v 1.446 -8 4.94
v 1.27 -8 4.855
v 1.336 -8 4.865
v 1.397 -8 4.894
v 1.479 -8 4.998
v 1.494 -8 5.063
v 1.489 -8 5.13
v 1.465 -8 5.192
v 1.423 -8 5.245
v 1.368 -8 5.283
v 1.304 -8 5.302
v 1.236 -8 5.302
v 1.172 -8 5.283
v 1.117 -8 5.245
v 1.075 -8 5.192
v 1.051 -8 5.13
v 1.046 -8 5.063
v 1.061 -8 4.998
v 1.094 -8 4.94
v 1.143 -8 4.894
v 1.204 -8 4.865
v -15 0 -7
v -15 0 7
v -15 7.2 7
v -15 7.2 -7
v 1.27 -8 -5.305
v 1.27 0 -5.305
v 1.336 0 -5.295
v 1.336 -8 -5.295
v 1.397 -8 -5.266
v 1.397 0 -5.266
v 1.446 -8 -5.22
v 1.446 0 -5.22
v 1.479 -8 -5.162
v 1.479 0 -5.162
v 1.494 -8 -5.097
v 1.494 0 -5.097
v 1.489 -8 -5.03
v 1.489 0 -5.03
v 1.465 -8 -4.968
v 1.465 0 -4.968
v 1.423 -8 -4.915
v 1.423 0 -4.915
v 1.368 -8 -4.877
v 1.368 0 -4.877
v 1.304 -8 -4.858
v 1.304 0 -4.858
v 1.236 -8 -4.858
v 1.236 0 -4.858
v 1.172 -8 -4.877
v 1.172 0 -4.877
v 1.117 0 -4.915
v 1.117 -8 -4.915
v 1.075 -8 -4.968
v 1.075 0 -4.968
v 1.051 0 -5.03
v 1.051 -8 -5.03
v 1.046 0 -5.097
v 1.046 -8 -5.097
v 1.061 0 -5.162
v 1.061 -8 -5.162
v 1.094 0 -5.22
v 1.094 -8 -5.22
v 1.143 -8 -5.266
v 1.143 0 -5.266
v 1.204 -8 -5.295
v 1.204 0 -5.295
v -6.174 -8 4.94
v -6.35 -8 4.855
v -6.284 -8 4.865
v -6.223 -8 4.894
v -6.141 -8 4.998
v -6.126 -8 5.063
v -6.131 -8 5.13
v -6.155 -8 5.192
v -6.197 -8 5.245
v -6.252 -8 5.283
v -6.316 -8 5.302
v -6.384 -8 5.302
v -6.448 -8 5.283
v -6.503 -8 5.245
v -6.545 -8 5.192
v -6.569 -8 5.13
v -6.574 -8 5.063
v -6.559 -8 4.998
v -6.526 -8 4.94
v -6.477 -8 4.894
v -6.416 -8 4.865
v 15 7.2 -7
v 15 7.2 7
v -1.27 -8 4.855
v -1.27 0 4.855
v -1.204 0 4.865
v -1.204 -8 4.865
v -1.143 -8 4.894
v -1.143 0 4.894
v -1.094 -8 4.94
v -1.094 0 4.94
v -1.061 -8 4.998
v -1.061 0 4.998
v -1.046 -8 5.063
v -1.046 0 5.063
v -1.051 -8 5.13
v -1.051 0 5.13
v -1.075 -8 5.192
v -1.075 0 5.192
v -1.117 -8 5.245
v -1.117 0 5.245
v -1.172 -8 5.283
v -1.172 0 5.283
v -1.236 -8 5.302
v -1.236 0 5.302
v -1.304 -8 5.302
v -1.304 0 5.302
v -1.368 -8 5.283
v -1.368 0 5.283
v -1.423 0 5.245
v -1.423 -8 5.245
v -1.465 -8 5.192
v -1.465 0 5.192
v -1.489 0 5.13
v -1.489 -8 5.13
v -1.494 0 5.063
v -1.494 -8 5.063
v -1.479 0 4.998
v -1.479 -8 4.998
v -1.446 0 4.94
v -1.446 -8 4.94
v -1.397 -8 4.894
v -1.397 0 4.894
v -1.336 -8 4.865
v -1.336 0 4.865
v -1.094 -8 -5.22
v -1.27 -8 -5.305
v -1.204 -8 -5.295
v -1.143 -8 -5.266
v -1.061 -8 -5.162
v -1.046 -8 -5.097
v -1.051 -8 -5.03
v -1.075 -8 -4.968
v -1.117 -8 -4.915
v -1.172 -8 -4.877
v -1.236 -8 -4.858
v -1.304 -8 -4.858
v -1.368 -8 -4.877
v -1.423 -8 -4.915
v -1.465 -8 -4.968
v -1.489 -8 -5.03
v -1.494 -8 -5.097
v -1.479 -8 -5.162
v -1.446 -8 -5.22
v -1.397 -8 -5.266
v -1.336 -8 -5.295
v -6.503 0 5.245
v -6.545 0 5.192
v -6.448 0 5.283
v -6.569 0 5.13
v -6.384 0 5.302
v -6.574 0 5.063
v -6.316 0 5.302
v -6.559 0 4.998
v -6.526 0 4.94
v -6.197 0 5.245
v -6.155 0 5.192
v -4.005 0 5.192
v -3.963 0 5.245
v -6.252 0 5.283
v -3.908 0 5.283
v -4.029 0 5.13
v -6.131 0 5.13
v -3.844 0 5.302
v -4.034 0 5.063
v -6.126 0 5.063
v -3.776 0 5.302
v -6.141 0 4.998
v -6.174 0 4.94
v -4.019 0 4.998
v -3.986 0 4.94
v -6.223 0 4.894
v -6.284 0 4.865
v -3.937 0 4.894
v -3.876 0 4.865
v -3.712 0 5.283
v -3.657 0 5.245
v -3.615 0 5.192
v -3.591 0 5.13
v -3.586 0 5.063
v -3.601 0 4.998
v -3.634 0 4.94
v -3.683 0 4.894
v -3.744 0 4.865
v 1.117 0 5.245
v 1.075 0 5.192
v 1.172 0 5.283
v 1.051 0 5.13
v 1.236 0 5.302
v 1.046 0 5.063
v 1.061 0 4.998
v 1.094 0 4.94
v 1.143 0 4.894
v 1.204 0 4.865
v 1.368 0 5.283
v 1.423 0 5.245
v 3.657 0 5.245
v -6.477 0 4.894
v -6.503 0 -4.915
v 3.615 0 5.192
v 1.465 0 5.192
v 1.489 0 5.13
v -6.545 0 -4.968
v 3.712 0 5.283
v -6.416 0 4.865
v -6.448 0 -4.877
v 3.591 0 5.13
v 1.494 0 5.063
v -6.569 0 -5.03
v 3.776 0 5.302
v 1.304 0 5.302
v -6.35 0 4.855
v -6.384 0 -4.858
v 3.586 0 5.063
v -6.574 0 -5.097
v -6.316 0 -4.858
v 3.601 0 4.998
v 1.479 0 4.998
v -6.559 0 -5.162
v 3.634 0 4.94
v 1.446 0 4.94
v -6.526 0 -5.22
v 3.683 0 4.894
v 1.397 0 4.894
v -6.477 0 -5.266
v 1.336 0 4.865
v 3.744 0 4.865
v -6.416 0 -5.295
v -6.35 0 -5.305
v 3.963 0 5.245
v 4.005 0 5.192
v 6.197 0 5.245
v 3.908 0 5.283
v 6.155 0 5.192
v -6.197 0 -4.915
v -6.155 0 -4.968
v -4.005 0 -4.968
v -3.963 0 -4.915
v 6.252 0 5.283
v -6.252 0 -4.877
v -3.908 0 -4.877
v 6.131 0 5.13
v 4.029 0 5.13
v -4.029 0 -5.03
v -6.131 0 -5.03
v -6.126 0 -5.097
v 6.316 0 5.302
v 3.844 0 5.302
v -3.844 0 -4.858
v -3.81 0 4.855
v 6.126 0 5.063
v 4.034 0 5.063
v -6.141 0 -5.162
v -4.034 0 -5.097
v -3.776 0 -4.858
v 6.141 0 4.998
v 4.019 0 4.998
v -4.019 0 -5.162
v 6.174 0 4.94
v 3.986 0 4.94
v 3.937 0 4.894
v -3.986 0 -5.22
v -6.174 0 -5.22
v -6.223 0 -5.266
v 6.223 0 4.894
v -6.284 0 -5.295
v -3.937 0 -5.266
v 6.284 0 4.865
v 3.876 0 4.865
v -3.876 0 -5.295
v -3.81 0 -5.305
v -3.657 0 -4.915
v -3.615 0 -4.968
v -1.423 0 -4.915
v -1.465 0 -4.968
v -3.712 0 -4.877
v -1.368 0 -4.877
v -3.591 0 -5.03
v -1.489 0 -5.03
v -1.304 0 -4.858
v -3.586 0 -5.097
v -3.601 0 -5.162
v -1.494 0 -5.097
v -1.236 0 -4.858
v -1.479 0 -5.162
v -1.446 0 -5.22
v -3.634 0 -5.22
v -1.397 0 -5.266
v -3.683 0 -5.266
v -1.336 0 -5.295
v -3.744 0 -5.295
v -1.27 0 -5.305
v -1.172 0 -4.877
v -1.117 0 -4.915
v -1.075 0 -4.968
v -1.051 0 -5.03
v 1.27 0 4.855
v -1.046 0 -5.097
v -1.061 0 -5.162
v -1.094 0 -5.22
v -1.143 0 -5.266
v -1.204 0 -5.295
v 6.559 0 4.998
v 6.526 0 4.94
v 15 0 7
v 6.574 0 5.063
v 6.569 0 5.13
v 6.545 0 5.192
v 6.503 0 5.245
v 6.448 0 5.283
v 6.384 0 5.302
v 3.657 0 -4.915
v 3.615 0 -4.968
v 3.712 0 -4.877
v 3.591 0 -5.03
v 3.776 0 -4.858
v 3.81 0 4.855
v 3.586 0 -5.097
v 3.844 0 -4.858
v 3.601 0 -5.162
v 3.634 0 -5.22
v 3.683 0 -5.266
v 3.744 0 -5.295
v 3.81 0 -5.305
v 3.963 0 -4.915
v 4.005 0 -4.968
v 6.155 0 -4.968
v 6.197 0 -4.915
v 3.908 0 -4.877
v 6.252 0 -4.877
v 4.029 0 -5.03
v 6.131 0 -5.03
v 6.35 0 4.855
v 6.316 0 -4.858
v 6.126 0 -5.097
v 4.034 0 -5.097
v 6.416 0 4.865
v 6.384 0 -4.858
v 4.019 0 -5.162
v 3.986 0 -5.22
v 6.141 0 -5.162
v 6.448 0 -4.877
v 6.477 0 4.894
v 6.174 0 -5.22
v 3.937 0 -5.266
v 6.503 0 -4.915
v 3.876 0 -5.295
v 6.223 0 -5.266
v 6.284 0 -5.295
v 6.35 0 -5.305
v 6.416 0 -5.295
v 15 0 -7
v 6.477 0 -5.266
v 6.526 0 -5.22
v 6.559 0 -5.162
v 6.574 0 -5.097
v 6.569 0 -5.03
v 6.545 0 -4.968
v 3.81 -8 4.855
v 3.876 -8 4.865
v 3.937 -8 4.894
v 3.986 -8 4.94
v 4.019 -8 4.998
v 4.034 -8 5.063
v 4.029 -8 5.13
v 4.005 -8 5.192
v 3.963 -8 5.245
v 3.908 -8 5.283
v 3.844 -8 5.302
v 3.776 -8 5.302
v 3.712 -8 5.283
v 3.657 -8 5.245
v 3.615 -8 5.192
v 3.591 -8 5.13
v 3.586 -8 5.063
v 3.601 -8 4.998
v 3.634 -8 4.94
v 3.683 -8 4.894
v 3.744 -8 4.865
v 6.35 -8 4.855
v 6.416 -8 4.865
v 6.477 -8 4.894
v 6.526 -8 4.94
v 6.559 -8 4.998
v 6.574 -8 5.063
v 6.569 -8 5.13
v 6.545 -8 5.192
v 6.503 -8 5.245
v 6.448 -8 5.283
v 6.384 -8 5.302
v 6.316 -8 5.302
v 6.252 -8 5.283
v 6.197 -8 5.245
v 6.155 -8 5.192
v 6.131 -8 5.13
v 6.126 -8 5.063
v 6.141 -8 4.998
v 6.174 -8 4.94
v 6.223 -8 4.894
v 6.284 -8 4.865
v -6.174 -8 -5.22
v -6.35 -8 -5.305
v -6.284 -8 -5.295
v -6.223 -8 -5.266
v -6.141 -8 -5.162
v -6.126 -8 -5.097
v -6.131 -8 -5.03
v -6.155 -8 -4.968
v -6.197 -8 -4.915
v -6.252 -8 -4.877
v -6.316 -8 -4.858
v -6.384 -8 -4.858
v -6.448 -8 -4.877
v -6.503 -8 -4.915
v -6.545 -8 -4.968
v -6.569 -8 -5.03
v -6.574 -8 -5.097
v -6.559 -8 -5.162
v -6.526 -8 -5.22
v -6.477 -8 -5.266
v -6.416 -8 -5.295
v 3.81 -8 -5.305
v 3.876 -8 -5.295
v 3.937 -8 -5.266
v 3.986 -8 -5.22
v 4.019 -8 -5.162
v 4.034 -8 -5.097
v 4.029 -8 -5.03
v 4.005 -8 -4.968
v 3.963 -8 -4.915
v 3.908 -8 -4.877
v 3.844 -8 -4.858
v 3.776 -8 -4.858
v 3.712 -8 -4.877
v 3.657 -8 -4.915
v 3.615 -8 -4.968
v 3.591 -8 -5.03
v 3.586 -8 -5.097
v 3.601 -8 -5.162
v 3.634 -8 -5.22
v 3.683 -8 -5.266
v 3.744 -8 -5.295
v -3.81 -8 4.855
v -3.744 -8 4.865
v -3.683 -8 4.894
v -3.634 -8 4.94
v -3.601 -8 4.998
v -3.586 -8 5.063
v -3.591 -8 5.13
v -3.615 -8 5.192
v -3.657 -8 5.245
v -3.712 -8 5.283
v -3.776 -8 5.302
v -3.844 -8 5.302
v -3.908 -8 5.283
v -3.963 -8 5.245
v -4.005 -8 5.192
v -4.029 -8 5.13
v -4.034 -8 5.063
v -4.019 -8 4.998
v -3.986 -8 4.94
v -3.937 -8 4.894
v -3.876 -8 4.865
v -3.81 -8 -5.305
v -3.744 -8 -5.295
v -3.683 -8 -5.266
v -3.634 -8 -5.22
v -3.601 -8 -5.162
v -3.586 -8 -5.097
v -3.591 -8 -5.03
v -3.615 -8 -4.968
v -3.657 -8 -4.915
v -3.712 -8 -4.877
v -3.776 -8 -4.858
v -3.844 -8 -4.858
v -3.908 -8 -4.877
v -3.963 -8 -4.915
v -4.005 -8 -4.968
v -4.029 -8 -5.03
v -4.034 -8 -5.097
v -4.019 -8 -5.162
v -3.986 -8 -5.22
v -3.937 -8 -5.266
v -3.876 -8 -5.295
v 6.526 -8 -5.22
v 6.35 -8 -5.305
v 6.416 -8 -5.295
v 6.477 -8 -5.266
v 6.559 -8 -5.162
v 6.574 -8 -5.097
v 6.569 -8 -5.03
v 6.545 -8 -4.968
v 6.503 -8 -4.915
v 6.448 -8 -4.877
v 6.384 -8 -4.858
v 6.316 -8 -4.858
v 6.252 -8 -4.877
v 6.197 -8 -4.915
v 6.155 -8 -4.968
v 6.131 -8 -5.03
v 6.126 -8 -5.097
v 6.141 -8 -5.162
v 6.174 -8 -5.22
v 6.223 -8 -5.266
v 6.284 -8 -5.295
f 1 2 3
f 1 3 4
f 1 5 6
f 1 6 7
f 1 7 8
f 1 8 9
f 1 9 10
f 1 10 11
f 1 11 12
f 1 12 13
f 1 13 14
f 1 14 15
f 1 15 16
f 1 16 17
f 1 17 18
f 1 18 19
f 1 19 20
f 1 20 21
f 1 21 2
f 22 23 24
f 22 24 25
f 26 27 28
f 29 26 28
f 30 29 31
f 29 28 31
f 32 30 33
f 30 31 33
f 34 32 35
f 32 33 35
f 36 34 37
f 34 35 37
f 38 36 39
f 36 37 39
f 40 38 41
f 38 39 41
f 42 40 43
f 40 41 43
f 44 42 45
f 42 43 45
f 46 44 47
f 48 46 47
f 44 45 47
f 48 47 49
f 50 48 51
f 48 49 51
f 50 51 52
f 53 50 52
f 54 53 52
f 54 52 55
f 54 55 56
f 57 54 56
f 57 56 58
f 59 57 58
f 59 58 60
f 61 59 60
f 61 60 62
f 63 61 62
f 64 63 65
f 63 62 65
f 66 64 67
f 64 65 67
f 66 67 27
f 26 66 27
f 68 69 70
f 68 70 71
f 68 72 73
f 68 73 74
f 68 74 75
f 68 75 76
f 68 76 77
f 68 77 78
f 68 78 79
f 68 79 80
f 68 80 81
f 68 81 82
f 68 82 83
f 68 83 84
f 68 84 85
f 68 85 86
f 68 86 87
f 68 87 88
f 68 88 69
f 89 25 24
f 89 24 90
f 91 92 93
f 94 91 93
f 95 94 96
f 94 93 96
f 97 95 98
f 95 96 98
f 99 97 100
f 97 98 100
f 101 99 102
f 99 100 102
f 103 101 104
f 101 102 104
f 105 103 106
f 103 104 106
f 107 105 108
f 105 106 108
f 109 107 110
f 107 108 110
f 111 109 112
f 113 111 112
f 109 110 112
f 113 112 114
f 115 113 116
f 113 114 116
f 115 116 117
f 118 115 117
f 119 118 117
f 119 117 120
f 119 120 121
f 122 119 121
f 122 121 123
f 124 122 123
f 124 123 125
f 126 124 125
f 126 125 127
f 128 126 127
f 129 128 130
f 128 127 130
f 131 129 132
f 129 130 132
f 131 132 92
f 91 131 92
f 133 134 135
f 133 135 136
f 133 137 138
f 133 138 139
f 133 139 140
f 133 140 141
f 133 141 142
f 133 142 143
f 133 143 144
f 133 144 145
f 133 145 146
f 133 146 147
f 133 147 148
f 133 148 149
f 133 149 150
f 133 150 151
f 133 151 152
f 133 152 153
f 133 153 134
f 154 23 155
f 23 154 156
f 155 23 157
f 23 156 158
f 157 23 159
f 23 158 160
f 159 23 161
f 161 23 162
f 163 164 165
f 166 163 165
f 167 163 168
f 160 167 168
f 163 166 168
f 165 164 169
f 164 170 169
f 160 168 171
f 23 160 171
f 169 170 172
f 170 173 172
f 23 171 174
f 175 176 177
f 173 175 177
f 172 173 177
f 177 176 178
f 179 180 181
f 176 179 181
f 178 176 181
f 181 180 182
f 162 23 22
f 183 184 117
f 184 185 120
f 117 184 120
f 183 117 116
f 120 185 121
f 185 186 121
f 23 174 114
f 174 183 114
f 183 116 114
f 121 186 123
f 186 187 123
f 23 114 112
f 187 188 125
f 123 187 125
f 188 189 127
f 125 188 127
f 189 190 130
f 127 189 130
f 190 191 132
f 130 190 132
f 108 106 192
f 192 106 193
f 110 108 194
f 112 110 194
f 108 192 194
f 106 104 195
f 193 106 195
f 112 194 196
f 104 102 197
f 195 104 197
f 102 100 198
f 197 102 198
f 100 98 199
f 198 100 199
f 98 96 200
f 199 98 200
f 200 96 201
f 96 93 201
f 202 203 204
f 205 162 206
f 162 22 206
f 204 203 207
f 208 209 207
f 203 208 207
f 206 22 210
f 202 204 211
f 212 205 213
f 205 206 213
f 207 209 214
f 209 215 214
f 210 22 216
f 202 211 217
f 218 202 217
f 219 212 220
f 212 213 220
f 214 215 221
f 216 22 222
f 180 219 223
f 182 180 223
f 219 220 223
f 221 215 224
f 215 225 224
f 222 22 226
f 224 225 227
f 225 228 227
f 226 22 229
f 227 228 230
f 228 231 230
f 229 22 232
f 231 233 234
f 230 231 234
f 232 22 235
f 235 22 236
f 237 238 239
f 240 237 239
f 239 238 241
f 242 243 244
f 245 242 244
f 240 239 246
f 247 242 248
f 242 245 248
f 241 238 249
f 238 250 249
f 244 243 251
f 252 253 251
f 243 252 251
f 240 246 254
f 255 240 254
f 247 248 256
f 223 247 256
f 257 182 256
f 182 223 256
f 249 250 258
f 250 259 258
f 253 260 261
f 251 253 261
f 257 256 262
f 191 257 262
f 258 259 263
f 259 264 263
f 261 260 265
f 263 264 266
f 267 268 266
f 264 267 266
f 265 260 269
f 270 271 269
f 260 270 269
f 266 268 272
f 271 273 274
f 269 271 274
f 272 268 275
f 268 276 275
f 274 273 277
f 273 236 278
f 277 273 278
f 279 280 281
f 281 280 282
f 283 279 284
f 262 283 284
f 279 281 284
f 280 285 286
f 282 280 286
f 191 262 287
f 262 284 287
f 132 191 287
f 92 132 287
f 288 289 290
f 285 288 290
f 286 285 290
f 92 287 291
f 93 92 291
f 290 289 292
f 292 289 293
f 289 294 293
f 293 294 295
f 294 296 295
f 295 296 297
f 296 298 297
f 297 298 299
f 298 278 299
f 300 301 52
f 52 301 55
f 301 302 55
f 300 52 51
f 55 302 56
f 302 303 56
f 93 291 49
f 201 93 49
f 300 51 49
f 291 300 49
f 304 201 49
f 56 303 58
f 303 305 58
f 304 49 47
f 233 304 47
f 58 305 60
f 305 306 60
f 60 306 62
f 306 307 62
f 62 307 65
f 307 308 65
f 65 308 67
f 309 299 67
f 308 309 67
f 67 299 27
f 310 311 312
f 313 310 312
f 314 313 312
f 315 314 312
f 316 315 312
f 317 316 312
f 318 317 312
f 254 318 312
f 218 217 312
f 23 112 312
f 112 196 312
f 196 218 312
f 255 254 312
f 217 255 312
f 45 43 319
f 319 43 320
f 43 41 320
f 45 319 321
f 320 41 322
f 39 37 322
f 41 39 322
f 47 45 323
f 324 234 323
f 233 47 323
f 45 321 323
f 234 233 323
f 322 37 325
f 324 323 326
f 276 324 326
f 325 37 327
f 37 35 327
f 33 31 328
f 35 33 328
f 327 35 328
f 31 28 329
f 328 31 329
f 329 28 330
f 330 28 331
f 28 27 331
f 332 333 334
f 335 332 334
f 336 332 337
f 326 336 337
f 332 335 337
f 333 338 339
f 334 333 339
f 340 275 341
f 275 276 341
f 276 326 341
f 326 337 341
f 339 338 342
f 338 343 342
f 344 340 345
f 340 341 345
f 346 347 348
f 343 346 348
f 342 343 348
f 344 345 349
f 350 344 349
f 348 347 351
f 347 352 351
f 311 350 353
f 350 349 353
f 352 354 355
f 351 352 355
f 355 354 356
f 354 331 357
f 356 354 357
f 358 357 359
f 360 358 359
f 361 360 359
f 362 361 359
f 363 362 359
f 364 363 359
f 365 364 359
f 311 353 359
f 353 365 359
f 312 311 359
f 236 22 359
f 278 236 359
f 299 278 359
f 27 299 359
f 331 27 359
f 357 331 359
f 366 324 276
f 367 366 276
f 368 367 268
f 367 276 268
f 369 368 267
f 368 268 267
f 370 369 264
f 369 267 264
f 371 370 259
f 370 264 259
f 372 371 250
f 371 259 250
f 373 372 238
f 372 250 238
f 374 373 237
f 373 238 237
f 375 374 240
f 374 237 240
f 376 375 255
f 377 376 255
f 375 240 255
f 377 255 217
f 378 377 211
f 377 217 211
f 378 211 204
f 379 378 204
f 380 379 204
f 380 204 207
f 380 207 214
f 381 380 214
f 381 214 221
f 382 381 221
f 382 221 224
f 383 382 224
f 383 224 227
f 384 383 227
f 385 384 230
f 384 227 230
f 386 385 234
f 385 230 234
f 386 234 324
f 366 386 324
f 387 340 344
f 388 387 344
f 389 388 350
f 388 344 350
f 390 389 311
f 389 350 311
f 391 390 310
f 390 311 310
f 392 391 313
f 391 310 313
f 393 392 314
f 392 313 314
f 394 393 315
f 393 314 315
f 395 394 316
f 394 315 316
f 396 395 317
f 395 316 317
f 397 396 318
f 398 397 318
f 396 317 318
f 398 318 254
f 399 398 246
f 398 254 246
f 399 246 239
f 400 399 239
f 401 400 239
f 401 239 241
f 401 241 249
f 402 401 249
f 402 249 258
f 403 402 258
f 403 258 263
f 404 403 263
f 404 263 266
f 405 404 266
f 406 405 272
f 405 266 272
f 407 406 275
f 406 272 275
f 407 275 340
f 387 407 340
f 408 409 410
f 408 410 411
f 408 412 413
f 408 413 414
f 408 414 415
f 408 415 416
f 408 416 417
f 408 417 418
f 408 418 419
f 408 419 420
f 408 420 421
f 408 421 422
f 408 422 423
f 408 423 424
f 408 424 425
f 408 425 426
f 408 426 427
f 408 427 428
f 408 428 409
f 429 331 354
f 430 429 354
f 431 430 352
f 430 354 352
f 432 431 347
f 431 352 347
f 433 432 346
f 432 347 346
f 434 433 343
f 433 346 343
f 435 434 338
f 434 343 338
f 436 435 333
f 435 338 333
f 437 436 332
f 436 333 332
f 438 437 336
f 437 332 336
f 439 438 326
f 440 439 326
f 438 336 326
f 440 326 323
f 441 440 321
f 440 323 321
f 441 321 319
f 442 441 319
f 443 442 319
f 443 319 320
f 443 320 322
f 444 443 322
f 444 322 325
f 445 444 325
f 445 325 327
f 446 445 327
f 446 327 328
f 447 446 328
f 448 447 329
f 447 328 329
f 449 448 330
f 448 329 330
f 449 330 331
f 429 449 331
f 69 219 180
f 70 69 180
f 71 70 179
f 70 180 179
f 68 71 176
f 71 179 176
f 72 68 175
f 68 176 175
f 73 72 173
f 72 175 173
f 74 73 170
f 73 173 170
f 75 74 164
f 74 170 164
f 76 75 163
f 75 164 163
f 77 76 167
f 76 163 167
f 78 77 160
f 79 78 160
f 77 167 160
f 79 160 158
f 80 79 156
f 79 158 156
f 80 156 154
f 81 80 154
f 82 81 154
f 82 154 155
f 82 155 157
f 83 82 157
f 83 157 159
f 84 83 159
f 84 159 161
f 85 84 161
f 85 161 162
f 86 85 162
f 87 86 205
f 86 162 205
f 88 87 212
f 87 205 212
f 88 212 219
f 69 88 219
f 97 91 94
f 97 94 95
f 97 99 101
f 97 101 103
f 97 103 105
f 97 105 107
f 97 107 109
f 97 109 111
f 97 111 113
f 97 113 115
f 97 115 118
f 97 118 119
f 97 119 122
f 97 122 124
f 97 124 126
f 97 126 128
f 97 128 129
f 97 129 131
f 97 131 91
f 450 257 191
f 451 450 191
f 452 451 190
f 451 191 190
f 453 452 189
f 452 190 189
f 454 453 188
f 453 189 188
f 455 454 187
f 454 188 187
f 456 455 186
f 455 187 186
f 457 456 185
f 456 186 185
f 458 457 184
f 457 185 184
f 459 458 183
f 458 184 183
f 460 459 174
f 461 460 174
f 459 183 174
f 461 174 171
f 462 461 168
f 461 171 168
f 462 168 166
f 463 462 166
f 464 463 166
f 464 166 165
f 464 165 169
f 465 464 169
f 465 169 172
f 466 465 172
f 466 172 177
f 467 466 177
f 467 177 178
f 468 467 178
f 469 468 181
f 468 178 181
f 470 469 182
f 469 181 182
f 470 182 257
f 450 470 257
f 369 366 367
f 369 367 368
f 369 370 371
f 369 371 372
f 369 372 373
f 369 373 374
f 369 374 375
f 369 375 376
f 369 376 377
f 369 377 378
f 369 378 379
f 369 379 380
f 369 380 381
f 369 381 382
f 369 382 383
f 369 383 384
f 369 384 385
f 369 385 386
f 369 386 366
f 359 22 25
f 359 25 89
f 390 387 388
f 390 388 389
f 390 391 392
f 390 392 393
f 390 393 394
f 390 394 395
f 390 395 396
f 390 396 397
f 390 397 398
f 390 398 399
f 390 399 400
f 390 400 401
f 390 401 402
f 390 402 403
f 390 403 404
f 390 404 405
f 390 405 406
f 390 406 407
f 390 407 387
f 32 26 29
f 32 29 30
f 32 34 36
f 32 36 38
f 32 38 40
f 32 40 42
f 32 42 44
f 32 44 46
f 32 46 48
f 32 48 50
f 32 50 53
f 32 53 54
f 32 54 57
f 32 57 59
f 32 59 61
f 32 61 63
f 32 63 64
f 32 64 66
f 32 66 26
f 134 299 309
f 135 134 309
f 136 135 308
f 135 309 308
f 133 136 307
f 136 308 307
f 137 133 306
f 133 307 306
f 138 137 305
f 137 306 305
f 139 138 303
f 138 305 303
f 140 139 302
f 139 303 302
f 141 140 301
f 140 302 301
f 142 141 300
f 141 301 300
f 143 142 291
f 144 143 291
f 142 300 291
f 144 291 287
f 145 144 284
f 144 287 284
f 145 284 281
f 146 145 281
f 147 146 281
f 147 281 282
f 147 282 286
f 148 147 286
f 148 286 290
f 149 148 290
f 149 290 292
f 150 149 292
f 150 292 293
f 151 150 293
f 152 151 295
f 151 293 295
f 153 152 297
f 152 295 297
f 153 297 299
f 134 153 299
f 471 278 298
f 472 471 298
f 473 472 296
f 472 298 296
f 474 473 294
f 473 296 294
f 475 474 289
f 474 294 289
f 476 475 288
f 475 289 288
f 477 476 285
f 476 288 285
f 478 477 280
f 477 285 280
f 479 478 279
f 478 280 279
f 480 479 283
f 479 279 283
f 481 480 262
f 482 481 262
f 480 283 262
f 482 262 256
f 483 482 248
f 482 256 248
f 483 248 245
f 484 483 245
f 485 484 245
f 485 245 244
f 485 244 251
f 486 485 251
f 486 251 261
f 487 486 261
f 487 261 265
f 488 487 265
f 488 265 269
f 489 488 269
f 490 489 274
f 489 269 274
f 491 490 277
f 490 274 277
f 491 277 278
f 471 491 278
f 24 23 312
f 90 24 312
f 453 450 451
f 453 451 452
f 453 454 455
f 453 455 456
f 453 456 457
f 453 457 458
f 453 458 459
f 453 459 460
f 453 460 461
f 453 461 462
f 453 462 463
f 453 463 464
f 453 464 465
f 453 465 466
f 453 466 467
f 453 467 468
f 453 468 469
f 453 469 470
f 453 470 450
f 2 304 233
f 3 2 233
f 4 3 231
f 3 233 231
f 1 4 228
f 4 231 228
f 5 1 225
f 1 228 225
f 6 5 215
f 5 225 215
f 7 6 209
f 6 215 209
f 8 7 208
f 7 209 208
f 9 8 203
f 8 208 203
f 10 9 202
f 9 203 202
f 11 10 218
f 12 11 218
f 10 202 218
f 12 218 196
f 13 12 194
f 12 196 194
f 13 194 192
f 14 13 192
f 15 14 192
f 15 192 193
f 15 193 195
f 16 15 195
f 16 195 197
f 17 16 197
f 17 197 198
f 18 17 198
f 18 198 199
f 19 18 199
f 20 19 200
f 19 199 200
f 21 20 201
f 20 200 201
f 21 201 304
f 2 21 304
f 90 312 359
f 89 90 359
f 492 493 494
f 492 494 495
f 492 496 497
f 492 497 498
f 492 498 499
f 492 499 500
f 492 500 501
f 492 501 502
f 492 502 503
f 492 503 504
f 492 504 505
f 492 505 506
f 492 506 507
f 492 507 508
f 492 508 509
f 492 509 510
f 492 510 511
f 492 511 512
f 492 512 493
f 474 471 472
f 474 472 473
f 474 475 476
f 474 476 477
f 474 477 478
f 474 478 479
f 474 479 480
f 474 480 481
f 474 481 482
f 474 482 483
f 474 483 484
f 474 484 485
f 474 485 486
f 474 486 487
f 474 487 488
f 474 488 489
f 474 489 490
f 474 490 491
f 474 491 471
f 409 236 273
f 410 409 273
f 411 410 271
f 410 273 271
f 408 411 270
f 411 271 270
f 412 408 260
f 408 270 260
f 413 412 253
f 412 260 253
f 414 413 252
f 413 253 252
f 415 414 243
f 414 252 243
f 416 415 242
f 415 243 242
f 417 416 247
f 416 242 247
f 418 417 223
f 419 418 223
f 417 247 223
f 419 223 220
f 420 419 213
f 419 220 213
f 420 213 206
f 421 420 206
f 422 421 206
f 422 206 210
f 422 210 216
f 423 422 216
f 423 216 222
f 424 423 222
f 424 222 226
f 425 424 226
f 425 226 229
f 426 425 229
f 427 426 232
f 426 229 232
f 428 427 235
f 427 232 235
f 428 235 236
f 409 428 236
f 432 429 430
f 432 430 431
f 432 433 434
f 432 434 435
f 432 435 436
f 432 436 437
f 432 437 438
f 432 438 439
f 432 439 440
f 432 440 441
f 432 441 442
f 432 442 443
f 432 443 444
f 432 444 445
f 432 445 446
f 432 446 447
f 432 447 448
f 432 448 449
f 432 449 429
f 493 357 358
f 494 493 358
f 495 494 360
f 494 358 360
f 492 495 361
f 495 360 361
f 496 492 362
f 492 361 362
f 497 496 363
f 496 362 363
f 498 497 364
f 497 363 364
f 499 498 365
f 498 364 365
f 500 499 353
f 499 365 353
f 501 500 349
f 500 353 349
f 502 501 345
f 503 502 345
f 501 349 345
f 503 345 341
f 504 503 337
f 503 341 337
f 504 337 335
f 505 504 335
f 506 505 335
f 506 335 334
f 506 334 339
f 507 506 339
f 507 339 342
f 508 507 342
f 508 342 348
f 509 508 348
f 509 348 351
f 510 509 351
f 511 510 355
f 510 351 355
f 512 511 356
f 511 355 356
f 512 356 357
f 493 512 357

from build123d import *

# Parameters (mm, degrees)
SKETCH1_W           = 30
SKETCH1_H           = 14
BOSS_EXTRUDE1_DEPTH = 7.2
SKETCH2_R           = 0.225
BOSS_EXTRUDE2_DEPTH = 8


with BuildPart() as part:
    # Sketch1 → Boss-Extrude1 (new body)
    with BuildSketch(Plane(origin=(0, 0, 0), x_dir=(1, 0, 0), z_dir=(0, 1, 0))):
        Rectangle(SKETCH1_W, SKETCH1_H)
    extrude(amount=BOSS_EXTRUDE1_DEPTH)

    # Sketch2 → Boss-Extrude2 (add)
    with BuildSketch(Plane.XZ):
        with Locations(Location((-6.35, -5.08, 0), (0, 0, 270))):
            Circle(SKETCH2_R)
        with Locations(Location((-3.81, -5.08, 0), (0, 0, 270))):
            Circle(SKETCH2_R)
        with Locations(Location((-1.27, -5.08, 0), (0, 0, 270))):
            Circle(SKETCH2_R)
        with Locations(Location((1.27, -5.08, 0), (0, 0, 270))):
            Circle(SKETCH2_R)
        with Locations(Location((3.81, -5.08, 0), (0, 0, 270))):
            Circle(SKETCH2_R)
        with Locations(Location((6.35, -5.08, 0), (0, 0, 270))):
            Circle(SKETCH2_R)
        with Locations(Location((-3.81, 5.08, 0), (0, 0, 270))):
            Circle(SKETCH2_R)
        with Locations(Location((-1.27, 5.08, 0), (0, 0, 270))):
            Circle(SKETCH2_R)
        with Locations(Location((1.27, 5.08, 0), (0, 0, 270))):
            Circle(SKETCH2_R)
        with Locations(Location((3.81, 5.08, 0), (0, 0, 270))):
            Circle(SKETCH2_R)
        with Locations(Location((6.35, 5.08, 0), (0, 0, 270))):
            Circle(SKETCH2_R)
        with Locations(Location((-6.35, 5.08, 0), (0, 0, 270))):
            Circle(SKETCH2_R)
    extrude(amount=BOSS_EXTRUDE2_DEPTH)


solid = part.part
